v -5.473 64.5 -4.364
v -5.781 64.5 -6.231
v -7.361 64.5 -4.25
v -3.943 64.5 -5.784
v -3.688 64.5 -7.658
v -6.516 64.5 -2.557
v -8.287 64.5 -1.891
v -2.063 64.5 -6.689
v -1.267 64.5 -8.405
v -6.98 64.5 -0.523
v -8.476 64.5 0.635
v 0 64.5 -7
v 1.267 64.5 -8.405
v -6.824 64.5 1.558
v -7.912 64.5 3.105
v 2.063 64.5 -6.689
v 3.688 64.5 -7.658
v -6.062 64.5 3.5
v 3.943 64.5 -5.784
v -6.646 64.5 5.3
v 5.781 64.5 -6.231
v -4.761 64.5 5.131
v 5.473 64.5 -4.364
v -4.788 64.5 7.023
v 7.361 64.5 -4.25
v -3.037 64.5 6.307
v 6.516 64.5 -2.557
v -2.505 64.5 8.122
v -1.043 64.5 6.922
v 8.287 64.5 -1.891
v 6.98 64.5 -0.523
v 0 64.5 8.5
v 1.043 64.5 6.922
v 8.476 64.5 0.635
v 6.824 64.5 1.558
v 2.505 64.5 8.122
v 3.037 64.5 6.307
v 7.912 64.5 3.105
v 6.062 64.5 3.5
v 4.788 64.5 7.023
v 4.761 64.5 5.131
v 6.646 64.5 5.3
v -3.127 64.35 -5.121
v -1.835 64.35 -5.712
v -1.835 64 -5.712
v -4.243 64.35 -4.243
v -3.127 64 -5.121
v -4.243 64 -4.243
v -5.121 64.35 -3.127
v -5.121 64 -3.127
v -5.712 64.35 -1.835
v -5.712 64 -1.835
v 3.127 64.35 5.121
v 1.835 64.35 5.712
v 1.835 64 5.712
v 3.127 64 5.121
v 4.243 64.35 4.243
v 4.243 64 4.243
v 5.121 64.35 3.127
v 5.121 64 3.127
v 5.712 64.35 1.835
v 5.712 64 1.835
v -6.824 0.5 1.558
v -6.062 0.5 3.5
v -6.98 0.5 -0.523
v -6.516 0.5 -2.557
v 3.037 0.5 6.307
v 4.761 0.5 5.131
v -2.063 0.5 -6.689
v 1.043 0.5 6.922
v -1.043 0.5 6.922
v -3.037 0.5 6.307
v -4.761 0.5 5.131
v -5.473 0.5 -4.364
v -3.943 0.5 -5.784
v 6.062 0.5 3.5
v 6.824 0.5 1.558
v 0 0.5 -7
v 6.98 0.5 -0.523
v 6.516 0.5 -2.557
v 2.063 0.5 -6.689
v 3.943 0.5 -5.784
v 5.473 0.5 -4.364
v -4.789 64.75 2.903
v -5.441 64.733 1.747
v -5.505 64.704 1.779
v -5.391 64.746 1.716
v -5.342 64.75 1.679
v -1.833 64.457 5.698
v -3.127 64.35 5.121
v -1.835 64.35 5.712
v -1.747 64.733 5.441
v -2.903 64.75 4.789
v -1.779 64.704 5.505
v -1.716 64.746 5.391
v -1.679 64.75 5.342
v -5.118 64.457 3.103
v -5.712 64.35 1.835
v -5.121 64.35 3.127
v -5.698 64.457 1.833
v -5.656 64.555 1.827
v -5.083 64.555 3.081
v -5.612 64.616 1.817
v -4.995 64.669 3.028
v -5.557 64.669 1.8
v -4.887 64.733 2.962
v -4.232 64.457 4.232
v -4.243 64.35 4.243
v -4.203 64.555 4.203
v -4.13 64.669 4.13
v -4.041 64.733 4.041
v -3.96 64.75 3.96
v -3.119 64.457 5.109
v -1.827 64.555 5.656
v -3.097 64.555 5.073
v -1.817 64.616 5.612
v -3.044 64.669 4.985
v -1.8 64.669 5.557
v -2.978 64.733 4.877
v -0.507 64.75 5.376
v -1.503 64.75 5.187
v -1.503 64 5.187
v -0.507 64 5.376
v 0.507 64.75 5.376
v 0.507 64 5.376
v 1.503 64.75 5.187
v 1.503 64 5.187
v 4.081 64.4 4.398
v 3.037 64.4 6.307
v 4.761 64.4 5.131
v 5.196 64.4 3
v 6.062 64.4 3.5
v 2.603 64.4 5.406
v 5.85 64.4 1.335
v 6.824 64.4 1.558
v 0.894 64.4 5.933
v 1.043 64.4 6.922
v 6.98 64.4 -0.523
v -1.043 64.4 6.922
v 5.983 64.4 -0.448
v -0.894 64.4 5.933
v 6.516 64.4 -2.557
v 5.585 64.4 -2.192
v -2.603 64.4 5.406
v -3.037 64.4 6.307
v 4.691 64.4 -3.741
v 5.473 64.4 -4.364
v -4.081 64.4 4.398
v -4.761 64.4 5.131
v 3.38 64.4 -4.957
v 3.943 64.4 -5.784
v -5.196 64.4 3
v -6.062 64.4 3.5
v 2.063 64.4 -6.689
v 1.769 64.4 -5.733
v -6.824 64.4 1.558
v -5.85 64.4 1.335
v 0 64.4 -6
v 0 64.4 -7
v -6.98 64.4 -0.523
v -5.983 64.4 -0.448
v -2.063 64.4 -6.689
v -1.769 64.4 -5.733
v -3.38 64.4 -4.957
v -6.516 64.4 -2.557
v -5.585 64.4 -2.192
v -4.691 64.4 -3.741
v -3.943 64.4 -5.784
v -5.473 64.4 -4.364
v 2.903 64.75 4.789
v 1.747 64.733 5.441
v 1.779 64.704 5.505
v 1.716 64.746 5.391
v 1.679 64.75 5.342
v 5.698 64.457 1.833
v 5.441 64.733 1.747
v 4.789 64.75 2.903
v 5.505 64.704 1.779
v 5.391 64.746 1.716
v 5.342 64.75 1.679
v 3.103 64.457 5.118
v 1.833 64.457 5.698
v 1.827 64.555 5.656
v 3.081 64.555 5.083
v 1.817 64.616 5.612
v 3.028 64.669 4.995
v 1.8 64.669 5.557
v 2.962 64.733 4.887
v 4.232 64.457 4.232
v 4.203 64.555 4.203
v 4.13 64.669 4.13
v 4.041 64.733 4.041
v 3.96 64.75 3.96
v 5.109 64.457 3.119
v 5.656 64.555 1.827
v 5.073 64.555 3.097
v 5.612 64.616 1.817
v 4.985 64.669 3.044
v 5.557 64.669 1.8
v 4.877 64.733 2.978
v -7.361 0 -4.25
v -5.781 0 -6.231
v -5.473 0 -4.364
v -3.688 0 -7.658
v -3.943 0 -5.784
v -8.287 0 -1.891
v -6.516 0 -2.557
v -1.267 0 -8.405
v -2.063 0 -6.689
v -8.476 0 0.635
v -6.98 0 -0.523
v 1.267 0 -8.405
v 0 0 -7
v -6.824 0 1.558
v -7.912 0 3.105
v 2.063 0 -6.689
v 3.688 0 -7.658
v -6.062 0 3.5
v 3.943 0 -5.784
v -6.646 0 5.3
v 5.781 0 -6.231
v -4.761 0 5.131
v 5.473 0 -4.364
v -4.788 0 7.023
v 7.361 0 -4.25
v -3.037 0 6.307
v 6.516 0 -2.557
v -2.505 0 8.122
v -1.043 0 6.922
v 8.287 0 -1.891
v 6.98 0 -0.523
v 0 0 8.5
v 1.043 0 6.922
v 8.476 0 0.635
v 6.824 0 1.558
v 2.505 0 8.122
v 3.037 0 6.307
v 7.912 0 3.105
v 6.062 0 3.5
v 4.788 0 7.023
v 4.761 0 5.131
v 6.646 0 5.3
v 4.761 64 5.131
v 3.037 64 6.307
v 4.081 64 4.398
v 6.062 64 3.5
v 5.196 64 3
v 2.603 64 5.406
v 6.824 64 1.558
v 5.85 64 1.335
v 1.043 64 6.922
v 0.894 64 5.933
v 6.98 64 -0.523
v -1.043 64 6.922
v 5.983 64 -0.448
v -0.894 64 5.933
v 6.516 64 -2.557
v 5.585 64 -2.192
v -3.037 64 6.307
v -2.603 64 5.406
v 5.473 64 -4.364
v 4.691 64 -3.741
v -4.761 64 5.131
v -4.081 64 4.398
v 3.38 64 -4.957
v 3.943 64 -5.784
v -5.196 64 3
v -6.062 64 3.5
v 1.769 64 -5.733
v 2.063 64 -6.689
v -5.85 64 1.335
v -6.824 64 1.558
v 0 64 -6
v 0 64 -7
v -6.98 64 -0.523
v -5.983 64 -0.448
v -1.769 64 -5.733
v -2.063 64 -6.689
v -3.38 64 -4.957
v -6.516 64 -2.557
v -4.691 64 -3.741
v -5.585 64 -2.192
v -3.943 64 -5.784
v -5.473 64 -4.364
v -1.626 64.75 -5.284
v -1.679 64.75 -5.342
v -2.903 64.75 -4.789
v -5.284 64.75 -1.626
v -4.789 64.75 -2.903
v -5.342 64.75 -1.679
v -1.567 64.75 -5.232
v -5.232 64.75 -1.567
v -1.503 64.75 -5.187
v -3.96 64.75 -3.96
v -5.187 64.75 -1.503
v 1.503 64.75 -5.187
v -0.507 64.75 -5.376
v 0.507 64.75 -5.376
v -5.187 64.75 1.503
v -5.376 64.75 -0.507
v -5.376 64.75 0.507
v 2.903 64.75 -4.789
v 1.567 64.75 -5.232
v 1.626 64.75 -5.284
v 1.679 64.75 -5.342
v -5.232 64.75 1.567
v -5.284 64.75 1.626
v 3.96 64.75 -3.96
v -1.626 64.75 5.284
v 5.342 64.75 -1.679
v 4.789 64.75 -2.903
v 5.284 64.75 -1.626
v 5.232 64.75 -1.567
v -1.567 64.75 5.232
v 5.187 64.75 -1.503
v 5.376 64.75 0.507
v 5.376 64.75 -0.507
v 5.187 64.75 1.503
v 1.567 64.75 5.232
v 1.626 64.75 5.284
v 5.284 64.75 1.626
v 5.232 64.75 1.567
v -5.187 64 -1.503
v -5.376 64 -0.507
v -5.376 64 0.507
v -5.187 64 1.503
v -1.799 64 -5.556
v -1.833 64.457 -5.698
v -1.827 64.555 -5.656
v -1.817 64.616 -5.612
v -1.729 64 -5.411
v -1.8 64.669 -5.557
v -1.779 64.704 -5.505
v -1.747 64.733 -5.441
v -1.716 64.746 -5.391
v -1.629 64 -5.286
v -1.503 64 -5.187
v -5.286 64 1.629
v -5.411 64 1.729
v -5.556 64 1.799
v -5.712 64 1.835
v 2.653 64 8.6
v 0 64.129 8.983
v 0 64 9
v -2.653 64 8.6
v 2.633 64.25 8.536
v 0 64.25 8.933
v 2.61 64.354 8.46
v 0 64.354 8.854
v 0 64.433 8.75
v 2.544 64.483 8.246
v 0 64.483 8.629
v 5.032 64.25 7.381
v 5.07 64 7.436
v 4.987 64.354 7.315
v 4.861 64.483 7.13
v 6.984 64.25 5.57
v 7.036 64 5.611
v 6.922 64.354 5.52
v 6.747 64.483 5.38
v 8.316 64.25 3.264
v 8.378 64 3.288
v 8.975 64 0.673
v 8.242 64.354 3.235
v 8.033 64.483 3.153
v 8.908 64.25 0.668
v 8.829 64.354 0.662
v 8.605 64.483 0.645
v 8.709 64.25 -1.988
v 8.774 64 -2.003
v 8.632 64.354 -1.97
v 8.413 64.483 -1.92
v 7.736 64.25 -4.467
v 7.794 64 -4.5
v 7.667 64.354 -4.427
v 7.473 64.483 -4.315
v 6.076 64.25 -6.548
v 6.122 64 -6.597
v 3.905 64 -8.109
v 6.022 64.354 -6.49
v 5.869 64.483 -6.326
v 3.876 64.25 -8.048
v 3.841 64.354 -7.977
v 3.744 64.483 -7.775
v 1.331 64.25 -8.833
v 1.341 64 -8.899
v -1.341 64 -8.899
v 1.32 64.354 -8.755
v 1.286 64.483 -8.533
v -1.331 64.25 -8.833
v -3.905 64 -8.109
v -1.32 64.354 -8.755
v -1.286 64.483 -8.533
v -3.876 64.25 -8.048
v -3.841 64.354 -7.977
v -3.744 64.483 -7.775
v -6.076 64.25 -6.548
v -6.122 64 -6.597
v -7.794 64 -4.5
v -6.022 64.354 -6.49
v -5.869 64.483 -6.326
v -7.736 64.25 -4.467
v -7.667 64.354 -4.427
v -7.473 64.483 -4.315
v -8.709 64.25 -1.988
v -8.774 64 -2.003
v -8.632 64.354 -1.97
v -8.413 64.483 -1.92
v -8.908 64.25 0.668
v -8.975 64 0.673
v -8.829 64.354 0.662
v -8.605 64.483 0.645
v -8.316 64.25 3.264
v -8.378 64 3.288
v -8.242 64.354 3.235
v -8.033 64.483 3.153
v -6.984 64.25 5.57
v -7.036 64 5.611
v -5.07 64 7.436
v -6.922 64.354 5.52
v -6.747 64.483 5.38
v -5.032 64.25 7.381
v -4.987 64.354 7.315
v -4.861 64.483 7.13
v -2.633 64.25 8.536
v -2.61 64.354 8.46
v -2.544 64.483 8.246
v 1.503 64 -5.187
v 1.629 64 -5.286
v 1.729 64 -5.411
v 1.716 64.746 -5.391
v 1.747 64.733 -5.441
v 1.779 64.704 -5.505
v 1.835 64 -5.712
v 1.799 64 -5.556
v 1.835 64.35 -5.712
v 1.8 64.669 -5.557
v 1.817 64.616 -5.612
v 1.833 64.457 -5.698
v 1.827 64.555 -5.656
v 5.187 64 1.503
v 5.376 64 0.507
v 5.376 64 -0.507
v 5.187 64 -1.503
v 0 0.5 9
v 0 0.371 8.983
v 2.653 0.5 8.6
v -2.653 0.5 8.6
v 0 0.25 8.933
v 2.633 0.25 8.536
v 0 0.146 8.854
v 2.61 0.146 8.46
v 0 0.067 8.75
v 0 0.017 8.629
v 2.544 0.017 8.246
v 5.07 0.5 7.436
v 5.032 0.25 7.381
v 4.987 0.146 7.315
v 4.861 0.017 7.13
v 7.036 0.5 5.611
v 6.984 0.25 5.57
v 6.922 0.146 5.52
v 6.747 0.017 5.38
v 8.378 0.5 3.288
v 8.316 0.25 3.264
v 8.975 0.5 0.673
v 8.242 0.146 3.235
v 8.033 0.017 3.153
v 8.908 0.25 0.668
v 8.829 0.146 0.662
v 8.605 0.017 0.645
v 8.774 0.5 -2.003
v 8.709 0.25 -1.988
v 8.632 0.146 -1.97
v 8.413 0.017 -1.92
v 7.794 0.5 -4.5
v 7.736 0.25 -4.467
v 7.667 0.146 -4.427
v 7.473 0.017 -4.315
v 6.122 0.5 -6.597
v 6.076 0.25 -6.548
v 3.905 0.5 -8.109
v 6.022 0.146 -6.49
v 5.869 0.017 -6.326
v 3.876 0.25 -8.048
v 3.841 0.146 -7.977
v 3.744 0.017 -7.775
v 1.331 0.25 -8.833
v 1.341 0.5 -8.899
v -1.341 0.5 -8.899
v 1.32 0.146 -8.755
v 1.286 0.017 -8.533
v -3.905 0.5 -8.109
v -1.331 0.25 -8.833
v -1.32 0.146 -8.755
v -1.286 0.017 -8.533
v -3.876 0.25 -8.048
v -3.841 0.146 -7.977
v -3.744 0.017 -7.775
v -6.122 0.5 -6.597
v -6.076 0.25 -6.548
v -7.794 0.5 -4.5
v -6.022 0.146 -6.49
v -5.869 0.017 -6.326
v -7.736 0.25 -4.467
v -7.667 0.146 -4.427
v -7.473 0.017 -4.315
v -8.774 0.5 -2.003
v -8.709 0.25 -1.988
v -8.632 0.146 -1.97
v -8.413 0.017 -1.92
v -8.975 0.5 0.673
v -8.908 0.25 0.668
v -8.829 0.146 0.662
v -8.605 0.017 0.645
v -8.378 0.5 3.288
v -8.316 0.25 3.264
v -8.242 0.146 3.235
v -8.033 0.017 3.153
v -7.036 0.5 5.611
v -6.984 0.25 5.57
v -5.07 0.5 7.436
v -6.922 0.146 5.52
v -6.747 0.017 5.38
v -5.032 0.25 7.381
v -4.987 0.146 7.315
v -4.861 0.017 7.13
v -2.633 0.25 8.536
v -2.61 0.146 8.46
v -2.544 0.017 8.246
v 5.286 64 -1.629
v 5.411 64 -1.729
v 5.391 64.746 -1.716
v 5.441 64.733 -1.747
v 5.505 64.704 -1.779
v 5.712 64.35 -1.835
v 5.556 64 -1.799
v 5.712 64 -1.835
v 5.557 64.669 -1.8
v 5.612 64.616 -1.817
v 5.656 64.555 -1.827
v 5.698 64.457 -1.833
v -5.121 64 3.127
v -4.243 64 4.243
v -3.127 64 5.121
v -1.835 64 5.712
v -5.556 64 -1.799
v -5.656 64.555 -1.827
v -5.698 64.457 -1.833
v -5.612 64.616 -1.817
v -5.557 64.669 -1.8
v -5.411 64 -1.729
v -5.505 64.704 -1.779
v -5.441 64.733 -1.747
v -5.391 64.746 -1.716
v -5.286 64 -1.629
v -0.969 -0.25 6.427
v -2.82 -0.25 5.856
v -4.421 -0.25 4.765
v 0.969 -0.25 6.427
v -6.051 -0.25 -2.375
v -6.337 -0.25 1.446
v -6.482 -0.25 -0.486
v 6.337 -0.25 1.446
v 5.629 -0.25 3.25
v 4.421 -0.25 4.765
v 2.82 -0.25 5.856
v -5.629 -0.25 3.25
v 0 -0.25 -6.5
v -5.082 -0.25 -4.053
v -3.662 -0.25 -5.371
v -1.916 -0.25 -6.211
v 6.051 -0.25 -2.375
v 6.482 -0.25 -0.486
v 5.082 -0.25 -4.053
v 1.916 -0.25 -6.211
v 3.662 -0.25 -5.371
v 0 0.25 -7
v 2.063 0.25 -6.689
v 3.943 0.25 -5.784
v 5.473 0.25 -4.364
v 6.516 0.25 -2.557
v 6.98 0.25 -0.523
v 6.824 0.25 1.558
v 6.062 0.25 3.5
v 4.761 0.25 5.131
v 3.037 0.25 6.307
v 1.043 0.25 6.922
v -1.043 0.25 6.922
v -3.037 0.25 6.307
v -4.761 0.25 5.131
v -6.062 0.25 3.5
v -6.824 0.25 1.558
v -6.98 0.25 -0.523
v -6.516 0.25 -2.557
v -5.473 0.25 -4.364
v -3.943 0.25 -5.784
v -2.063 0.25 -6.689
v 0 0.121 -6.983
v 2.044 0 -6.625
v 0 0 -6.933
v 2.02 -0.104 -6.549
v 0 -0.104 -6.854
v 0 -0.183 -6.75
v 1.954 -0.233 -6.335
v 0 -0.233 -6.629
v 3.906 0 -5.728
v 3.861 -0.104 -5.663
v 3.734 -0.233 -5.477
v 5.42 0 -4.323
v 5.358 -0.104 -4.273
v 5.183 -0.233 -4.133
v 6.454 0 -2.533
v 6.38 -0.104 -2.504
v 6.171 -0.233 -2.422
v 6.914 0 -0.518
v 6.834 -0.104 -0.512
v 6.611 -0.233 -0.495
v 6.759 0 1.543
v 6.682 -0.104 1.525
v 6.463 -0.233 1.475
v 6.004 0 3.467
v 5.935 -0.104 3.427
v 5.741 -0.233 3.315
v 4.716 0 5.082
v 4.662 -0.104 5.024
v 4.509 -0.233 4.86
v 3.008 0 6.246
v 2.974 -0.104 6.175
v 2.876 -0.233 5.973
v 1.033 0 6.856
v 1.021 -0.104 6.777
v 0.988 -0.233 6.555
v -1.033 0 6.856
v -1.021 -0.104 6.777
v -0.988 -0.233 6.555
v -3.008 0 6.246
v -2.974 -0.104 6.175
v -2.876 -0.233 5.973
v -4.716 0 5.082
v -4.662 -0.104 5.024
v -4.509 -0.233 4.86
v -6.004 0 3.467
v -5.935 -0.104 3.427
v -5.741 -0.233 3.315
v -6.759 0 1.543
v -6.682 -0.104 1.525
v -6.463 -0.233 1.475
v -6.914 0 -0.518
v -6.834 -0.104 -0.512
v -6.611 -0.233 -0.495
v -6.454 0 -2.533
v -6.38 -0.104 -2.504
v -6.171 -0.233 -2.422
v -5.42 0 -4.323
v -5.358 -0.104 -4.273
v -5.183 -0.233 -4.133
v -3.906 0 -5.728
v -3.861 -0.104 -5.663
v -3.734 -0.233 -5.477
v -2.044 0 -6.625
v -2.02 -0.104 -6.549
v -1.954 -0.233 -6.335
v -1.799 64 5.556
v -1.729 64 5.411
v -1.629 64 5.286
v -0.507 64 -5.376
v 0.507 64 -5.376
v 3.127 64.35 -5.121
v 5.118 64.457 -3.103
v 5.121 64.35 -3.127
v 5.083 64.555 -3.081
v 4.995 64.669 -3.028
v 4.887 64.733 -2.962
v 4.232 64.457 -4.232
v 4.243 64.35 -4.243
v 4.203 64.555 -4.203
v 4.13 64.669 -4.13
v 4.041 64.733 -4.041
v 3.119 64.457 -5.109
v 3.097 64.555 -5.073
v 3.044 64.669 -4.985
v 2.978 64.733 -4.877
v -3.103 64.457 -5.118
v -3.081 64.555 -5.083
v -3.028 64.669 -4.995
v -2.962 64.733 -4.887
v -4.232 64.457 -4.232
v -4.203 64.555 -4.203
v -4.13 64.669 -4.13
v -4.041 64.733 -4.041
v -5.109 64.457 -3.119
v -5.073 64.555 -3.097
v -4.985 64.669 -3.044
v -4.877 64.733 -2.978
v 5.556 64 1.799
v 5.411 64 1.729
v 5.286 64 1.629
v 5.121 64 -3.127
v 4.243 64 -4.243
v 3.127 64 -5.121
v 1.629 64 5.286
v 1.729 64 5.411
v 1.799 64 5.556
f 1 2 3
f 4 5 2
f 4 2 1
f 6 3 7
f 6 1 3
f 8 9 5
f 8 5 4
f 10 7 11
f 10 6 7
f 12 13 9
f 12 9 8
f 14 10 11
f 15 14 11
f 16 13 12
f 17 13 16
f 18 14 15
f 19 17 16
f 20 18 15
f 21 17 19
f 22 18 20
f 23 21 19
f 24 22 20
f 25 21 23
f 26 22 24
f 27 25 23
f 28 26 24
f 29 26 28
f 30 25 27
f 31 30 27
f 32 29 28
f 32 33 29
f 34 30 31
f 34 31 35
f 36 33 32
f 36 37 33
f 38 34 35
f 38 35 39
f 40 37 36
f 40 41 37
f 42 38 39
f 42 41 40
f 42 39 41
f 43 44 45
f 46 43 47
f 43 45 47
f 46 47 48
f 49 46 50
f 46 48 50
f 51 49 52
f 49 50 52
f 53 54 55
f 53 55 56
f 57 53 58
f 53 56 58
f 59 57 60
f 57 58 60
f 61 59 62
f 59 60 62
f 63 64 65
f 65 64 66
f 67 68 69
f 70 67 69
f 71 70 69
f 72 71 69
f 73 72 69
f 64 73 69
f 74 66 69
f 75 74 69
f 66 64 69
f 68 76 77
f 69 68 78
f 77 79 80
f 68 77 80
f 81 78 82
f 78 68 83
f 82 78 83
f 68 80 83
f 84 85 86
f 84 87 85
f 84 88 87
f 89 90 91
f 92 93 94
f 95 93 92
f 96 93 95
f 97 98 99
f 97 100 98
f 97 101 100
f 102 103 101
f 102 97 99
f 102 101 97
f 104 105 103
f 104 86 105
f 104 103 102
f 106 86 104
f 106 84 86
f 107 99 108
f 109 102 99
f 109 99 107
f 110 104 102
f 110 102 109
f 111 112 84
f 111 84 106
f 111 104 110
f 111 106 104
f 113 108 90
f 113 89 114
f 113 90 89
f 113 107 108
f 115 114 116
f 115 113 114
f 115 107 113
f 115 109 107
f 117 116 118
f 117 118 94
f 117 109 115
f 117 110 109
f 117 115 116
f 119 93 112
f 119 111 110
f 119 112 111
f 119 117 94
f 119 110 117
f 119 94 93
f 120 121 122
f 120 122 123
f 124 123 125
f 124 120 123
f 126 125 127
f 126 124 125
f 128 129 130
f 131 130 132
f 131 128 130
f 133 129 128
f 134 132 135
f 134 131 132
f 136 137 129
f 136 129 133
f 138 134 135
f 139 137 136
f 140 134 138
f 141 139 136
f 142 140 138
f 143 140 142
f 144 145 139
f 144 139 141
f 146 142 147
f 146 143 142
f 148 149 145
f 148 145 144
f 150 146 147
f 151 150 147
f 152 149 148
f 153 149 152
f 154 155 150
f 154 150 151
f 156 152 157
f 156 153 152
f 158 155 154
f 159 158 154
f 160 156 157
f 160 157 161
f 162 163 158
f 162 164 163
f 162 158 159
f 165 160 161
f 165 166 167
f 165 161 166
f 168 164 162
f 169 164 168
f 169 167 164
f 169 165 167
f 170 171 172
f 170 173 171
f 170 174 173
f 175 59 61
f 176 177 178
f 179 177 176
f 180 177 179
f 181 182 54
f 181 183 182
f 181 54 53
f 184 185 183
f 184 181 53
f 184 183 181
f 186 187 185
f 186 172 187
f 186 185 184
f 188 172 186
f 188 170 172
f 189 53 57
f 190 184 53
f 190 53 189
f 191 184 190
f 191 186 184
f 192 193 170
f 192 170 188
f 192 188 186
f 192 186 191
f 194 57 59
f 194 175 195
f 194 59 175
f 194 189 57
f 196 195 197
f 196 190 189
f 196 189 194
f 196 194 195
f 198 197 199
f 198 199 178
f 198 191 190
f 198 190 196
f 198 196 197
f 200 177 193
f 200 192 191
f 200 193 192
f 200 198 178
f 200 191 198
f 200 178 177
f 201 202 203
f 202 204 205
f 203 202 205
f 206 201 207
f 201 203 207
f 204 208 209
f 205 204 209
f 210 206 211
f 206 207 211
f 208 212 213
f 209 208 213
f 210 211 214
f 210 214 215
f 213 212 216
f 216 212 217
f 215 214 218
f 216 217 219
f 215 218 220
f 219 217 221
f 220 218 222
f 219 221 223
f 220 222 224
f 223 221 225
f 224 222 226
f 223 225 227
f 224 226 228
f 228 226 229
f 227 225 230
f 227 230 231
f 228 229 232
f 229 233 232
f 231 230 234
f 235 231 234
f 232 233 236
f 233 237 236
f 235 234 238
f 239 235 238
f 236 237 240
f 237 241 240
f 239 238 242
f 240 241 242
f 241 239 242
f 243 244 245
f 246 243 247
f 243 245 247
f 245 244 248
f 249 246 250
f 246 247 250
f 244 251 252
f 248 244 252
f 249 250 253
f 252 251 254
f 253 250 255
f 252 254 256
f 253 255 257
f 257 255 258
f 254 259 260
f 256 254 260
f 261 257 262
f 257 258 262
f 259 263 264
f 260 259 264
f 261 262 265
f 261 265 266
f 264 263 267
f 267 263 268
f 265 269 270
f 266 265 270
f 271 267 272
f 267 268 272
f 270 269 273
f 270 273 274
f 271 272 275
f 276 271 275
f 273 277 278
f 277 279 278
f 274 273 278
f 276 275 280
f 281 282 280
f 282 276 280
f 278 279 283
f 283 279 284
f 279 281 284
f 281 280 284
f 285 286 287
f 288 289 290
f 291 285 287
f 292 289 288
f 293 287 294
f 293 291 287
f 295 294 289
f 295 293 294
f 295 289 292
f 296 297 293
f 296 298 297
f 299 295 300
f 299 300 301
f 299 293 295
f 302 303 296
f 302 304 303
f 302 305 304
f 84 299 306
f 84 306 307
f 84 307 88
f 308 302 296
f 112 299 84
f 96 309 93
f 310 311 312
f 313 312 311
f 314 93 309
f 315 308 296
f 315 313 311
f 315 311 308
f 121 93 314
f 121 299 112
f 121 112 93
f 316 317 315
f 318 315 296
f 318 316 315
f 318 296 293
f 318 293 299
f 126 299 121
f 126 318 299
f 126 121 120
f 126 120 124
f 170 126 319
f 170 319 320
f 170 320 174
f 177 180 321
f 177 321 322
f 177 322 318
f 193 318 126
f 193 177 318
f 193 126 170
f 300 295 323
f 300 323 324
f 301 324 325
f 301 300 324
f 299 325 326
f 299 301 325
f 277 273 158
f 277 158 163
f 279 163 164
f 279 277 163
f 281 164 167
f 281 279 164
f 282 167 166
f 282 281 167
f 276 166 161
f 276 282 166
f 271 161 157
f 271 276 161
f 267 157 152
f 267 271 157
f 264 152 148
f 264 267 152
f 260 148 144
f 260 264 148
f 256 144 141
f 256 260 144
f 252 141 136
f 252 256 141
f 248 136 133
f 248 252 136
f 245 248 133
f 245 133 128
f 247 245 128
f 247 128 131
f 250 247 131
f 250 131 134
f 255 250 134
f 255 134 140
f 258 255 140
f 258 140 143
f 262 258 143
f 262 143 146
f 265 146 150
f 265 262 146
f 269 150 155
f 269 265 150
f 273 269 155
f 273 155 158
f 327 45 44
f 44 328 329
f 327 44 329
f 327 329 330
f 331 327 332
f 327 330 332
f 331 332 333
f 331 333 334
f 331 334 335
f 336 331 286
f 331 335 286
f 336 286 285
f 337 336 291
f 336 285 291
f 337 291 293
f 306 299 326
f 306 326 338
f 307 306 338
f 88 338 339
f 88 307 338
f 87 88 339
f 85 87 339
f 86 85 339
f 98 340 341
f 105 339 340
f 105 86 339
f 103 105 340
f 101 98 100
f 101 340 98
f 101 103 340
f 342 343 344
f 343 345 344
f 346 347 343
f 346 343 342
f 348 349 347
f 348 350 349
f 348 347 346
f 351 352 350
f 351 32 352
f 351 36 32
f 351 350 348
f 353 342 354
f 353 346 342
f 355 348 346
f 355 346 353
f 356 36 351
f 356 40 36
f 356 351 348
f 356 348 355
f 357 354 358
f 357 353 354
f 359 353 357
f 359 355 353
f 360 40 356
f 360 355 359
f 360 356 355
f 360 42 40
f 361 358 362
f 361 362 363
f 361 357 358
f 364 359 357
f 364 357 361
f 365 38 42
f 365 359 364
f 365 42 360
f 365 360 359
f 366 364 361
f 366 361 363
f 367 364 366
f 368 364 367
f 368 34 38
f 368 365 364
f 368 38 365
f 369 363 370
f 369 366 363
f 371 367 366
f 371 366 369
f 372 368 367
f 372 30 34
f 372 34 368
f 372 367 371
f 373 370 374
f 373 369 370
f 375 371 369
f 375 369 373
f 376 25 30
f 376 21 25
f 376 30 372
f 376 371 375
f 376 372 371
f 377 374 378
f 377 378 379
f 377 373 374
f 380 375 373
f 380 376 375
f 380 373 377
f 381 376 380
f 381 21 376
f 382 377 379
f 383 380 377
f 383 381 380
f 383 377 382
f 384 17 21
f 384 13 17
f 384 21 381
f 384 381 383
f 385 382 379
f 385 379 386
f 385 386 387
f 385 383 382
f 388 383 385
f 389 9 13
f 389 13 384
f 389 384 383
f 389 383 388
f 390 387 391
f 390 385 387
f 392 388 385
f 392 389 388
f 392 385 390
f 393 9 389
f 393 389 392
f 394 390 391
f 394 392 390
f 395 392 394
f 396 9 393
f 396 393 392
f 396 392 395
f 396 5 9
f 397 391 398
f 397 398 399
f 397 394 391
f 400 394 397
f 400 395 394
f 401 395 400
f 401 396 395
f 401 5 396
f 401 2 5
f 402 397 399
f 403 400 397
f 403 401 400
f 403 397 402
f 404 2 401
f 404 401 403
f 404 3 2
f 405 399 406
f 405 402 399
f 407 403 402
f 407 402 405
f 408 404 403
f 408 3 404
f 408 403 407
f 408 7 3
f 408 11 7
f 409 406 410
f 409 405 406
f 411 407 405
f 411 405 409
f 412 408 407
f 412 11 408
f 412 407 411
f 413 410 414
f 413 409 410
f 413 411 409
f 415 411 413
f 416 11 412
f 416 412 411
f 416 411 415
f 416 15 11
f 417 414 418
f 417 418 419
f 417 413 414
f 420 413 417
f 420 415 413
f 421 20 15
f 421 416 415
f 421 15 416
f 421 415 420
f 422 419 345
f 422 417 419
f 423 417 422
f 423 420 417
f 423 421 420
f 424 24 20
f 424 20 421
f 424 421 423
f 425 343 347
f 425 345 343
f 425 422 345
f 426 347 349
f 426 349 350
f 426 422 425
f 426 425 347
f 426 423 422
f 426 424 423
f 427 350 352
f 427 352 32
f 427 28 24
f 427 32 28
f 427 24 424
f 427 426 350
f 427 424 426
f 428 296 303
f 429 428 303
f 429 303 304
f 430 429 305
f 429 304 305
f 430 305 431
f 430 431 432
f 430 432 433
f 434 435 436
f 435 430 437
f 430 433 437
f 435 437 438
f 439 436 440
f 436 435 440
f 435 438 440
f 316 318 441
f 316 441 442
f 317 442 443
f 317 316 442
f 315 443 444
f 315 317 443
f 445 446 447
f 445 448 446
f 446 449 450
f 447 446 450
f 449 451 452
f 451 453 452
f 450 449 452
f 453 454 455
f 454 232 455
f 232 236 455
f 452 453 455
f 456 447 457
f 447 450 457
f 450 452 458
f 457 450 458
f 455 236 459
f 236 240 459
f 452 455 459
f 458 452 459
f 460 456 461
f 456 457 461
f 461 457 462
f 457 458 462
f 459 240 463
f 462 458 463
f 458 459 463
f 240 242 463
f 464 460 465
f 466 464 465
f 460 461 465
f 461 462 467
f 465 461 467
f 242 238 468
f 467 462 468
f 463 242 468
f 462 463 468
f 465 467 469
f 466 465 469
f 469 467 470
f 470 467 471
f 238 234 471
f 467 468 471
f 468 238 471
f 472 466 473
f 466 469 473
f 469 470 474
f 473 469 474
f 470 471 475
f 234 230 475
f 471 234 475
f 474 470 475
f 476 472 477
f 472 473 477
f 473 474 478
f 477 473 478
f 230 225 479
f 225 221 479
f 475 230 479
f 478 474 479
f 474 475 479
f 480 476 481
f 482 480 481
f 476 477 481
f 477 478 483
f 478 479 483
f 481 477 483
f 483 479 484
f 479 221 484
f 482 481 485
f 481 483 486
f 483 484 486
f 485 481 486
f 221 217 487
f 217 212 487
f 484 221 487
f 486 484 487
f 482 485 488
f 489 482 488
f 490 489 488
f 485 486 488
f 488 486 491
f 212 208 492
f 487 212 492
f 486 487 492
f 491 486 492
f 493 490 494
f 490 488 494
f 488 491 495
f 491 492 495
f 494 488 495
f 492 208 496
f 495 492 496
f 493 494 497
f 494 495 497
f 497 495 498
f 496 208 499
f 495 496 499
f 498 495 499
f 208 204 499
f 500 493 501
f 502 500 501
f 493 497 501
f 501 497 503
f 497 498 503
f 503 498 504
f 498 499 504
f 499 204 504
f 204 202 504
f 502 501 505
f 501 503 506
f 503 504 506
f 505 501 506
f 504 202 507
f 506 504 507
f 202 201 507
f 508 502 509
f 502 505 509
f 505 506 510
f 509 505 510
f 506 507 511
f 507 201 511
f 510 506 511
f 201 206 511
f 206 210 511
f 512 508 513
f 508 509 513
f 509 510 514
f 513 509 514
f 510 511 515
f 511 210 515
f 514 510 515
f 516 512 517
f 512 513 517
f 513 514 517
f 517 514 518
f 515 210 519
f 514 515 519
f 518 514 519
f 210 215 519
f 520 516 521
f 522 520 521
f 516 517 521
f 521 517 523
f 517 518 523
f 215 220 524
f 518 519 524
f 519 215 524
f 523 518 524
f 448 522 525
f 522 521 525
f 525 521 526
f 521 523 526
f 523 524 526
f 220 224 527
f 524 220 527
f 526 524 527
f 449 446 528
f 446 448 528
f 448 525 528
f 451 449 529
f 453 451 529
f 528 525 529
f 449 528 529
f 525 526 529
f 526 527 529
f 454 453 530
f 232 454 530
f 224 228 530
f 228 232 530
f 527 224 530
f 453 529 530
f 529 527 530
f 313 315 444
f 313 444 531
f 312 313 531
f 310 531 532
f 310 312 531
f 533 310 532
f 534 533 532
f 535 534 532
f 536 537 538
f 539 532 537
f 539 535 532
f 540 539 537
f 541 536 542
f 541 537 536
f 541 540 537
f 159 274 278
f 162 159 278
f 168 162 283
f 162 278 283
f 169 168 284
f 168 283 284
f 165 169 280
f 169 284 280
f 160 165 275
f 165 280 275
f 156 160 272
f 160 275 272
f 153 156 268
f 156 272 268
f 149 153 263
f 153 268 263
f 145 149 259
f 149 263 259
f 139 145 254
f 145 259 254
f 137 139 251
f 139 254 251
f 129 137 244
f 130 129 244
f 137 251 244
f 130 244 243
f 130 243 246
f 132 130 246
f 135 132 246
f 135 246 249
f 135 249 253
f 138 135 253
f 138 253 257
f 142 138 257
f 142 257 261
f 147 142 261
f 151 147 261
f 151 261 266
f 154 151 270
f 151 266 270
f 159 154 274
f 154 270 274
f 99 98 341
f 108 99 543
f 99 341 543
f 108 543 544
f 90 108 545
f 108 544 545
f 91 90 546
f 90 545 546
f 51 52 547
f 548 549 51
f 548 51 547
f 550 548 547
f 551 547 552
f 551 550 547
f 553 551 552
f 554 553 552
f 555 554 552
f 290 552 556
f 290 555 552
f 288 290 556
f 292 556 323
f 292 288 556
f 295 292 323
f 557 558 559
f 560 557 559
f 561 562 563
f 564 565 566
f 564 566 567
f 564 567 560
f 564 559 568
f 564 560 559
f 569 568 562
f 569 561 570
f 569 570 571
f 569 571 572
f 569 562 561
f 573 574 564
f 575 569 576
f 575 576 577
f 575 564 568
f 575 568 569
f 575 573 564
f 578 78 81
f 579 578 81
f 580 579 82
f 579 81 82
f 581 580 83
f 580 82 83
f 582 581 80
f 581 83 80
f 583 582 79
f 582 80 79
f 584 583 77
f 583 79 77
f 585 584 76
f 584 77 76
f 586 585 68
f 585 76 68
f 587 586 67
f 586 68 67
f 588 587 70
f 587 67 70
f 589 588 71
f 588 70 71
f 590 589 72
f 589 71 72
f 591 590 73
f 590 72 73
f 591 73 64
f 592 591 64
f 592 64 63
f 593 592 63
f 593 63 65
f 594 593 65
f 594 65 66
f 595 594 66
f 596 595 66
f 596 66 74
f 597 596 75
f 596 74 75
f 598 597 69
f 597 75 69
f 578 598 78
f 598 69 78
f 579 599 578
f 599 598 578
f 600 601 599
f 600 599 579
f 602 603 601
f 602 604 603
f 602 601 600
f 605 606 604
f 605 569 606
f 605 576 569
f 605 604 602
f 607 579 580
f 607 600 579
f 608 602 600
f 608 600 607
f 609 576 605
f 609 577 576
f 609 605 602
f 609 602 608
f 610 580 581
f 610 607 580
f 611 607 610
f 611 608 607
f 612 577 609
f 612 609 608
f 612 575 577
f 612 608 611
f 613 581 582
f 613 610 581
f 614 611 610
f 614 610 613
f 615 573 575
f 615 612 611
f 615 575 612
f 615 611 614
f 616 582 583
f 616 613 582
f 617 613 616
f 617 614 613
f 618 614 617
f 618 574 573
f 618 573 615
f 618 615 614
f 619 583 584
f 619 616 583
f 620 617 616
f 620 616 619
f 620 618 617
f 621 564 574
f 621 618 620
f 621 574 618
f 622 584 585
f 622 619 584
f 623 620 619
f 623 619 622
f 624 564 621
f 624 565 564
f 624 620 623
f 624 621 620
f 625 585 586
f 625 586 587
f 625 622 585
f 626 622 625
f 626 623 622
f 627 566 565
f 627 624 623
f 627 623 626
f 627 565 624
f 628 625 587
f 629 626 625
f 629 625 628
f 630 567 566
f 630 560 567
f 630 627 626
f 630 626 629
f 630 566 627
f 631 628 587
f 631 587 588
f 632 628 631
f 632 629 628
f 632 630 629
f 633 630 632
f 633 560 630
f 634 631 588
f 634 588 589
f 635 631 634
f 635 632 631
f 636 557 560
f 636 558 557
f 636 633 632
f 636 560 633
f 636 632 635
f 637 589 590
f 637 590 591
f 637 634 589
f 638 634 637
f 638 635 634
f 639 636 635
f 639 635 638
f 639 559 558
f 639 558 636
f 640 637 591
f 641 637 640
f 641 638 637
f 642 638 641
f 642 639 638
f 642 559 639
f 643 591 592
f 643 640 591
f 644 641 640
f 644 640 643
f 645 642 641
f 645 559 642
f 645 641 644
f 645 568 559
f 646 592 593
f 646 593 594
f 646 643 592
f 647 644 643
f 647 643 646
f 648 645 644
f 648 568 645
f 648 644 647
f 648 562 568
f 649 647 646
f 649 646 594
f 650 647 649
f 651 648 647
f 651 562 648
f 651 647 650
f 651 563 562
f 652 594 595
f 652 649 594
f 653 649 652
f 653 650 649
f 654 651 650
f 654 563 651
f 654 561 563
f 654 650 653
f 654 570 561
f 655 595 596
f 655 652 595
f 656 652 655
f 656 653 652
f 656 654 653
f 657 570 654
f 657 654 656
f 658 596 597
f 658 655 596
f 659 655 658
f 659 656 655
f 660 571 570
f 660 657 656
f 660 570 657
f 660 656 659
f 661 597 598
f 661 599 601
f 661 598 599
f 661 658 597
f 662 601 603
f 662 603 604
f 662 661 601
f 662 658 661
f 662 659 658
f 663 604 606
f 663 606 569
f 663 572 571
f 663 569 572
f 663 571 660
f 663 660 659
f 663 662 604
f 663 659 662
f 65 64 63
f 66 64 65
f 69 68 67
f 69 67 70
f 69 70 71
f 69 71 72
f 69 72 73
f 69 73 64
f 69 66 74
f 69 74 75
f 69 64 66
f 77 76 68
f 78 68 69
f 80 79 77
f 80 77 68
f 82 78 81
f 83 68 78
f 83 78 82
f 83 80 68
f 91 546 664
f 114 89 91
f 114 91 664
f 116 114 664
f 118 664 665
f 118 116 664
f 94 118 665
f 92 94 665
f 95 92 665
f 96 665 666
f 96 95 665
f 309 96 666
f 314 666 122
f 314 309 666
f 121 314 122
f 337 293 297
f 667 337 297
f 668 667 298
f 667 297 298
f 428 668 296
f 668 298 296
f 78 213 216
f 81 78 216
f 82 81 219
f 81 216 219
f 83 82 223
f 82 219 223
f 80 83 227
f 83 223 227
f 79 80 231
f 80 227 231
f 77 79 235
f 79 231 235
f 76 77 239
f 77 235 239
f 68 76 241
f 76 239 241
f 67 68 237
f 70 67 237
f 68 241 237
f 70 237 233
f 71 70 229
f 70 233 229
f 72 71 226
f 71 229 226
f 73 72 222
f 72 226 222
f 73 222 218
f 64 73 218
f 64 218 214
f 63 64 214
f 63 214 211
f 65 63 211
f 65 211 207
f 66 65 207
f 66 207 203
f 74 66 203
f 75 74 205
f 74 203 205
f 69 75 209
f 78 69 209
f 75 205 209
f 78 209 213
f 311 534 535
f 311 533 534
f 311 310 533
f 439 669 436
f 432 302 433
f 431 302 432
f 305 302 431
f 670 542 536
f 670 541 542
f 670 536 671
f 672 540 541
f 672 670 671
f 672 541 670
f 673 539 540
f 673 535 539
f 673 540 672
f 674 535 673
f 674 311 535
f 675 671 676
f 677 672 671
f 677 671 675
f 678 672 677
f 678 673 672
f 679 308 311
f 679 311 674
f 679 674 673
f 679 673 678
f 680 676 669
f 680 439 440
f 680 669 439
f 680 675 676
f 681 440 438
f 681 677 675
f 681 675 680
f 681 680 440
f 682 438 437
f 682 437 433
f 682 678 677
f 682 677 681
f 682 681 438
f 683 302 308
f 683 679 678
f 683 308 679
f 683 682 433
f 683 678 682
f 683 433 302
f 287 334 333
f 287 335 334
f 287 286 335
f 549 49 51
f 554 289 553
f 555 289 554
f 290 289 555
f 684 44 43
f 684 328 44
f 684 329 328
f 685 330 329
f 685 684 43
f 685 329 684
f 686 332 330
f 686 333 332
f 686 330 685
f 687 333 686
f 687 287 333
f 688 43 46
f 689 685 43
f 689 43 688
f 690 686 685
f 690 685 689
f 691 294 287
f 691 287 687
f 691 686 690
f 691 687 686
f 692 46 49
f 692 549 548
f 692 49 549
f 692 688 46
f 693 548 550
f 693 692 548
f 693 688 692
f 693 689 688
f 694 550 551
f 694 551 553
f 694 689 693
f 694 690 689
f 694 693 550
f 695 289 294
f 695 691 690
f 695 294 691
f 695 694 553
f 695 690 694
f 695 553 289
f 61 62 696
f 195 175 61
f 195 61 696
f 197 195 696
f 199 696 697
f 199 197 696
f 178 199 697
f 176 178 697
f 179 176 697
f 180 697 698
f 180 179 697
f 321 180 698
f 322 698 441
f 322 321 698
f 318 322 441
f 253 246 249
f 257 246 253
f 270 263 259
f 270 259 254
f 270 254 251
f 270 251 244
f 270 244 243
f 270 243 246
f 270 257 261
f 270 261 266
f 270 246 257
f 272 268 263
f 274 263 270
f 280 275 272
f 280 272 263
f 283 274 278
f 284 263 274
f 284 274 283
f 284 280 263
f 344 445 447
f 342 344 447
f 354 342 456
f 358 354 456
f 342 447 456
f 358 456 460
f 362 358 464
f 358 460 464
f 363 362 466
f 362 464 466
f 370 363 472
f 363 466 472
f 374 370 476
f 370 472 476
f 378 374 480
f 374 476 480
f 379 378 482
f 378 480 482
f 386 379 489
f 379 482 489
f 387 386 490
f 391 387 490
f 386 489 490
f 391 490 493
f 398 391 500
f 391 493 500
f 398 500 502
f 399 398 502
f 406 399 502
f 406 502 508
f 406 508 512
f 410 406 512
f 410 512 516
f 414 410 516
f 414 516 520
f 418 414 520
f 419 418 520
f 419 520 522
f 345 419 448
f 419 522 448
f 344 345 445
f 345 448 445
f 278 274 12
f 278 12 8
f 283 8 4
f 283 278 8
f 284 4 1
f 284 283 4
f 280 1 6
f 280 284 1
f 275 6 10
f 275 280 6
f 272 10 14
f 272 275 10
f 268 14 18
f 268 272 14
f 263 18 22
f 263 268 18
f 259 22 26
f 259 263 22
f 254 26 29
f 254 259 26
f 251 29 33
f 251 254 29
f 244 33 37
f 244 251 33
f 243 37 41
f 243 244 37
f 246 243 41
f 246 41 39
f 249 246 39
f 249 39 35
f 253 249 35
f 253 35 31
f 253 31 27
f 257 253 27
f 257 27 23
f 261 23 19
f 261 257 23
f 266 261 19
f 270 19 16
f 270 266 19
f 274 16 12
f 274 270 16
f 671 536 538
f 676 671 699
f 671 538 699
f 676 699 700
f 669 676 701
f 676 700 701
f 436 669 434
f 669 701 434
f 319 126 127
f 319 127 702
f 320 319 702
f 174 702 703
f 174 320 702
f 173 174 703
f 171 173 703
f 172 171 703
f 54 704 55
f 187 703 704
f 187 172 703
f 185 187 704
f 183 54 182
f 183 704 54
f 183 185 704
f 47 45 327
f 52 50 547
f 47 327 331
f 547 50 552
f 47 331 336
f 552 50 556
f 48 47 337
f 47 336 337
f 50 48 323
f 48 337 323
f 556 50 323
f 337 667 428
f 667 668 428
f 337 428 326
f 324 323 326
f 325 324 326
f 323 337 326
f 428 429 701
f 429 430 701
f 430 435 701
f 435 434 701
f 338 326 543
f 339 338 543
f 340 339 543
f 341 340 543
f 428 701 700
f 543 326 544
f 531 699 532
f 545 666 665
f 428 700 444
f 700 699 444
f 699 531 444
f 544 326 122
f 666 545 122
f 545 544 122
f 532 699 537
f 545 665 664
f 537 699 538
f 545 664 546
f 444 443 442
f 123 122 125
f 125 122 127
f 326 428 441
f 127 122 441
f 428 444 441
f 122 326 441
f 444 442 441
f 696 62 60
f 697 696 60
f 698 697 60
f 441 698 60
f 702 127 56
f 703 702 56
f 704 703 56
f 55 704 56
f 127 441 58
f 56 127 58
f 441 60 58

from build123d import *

# Parameters (mm, degrees)
ESBO_O1_R                = 9
RESSALTO_EXTRUS_O1_DEPTH = 64.5
ESBO_O3_R                = 7
CORTE_EXTRUS_O1_DEPTH    = 0.5
ESBO_O4_R                = 7
RESSALTO_EXTRUS_O2_DEPTH = 0.75
FILETE2_R                = 0.5
CORTE_EXTRUS_O2_START    = -0.5
ESBO_O5_R                = 7
CORTE_EXTRUS_O2_DEPTH    = 0.5
ESBO_O6_R                = 7
ESBO_O6_R_2              = 6
RESSALTO_EXTRUS_O3_DEPTH = 0.4
ESBO_O7_R                = 6
RESSALTO_EXTRUS_O4_DEPTH = 0.75
FILETE3_R                = 0.4
FILETE4_R                = 0.5
CORTE_EXTRUS_O3_DEPTH    = 0.75


with BuildPart() as part:
    # Esboço1 → Ressalto-extrusão1 (new body)
    with BuildSketch(Plane(origin=(0, 0, 0), x_dir=(1, 0, 0), z_dir=(0, 1, 0))):
        with Locations(Location((0, 0, 0), (0, 0, 270))):
            Circle(ESBO_O1_R)
    extrude(amount=RESSALTO_EXTRUS_O1_DEPTH)

    # Esboço3 → Corte-extrusão1 (cut)
    with BuildSketch(Plane.XZ):
        with Locations(Location((0, 0, 0), (0, 0, 270))):
            Circle(ESBO_O3_R)
    extrude(amount=-CORTE_EXTRUS_O1_DEPTH, mode=Mode.SUBTRACT)

    # Esboço5 → Corte-extrusão2 (cut)
    with BuildSketch(Plane(origin=(0, 64.5, 0), x_dir=(1, 0, 0), z_dir=(0, 1, 0)).offset(CORTE_EXTRUS_O2_START)):
        with Locations(Location((0, 0, 0), (0, 0, 90))):
            Circle(ESBO_O5_R)
    extrude(amount=CORTE_EXTRUS_O2_DEPTH, mode=Mode.SUBTRACT)

    # Filete4
    filete4_edges = [part.edges().sort_by_distance(p)[0] for p in [
        (0, 0, -9),
        (0, 64.5, -9),
    ]]
    fillet(filete4_edges, radius=FILETE4_R)


with BuildPart() as body_2:
    # Esboço4 → Ressalto-extrusão2 (new body)
    with BuildSketch(Plane.XZ.offset(-0.5)):
        with Locations(Location((0, 0, 0), (0, 0, 270))):
            Circle(ESBO_O4_R)
    extrude(amount=RESSALTO_EXTRUS_O2_DEPTH)

    # Filete2
    filete2_edges = [body_2.edges().sort_by_distance(p)[0] for p in [
        (0, -0.25, 7),
    ]]
    fillet(filete2_edges, radius=FILETE2_R)


with BuildPart() as body_3:
    # Esboço6 → Ressalto-extrusão3 (new body)
    with BuildSketch(Plane(origin=(0, 64, 0), x_dir=(1, 0, 0), z_dir=(0, 1, 0))):
        with Locations(Location((0, 0, 0), (0, 0, 90))):
            Circle(ESBO_O6_R)
        with Locations(Location((0, 0, 0), (0, 0, 90))):
            Circle(ESBO_O6_R_2, mode=Mode.SUBTRACT)
    extrude(amount=RESSALTO_EXTRUS_O3_DEPTH)


with BuildPart() as body_4:
    # Esboço7 → Ressalto-extrusão4 (new body)
    with BuildSketch(Plane(origin=(0, 64, 0), x_dir=(1, 0, 0), z_dir=(0, 1, 0))):
        with Locations(Location((0, 0, 0), (0, 0, 270))):
            Circle(ESBO_O7_R)
    extrude(amount=RESSALTO_EXTRUS_O4_DEPTH)

    # Filete3
    filete3_edges = [body_4.edges().sort_by_distance(p)[0] for p in [
        (0, 64.75, -6),
    ]]
    fillet(filete3_edges, radius=FILETE3_R)

    # Esboço8 → Corte-extrusão3 (cut)
    with BuildSketch(Plane(origin=(0, 64.75, 0), x_dir=(1, 0, 0), z_dir=(0, 1, 0))):
        with BuildLine():
            ThreePointArc((-1.8352967, 5.712415078), (-1.729170633, 5.411457188), (-1.502590953, 5.186735045))
            ThreePointArc((-1.502590953, 5.186735045), (0, 5.4), (1.502590953, 5.186735045))
            ThreePointArc((1.502590953, 5.186735045), (1.729170633, 5.411457188), (1.8352967, 5.712415078))
            ThreePointArc((1.8352967, 5.712415078), (0, 6), (-1.8352967, 5.712415078))
        make_face()
        with BuildLine():
            ThreePointArc((5.712415078, -1.8352967), (5.411457188, -1.729170633), (5.186735045, -1.502590953))
            ThreePointArc((5.186735045, -1.502590953), (5.4, 0), (5.186735045, 1.502590953))
            ThreePointArc((5.186735045, 1.502590953), (5.411457188, 1.729170633), (5.712415078, 1.8352967))
            ThreePointArc((5.712415078, 1.8352967), (6, 0), (5.712415078, -1.8352967))
        make_face()
        with BuildLine():
            ThreePointArc((-1.8352967, -5.712415078), (-1.729170633, -5.411457188), (-1.502590953, -5.186735045))
            ThreePointArc((-1.502590953, -5.186735045), (0, -5.4), (1.502590953, -5.186735045))
            ThreePointArc((1.502590953, -5.186735045), (1.729170633, -5.411457188), (1.8352967, -5.712415078))
            ThreePointArc((1.8352967, -5.712415078), (0, -6), (-1.8352967, -5.712415078))
        make_face()
        with BuildLine():
            ThreePointArc((-5.712415078, 1.8352967), (-5.411457188, 1.729170633), (-5.186735045, 1.502590953))
            ThreePointArc((-5.186735045, 1.502590953), (-5.4, 0), (-5.186735045, -1.502590953))
            ThreePointArc((-5.186735045, -1.502590953), (-5.411457188, -1.729170633), (-5.712415078, -1.8352967))
            ThreePointArc((-5.712415078, -1.8352967), (-6, 0), (-5.712415078, 1.8352967))
        make_face()
    extrude(amount=-CORTE_EXTRUS_O3_DEPTH, mode=Mode.SUBTRACT)


solid = Compound([part.part, body_2.part, body_3.part, body_4.part])
